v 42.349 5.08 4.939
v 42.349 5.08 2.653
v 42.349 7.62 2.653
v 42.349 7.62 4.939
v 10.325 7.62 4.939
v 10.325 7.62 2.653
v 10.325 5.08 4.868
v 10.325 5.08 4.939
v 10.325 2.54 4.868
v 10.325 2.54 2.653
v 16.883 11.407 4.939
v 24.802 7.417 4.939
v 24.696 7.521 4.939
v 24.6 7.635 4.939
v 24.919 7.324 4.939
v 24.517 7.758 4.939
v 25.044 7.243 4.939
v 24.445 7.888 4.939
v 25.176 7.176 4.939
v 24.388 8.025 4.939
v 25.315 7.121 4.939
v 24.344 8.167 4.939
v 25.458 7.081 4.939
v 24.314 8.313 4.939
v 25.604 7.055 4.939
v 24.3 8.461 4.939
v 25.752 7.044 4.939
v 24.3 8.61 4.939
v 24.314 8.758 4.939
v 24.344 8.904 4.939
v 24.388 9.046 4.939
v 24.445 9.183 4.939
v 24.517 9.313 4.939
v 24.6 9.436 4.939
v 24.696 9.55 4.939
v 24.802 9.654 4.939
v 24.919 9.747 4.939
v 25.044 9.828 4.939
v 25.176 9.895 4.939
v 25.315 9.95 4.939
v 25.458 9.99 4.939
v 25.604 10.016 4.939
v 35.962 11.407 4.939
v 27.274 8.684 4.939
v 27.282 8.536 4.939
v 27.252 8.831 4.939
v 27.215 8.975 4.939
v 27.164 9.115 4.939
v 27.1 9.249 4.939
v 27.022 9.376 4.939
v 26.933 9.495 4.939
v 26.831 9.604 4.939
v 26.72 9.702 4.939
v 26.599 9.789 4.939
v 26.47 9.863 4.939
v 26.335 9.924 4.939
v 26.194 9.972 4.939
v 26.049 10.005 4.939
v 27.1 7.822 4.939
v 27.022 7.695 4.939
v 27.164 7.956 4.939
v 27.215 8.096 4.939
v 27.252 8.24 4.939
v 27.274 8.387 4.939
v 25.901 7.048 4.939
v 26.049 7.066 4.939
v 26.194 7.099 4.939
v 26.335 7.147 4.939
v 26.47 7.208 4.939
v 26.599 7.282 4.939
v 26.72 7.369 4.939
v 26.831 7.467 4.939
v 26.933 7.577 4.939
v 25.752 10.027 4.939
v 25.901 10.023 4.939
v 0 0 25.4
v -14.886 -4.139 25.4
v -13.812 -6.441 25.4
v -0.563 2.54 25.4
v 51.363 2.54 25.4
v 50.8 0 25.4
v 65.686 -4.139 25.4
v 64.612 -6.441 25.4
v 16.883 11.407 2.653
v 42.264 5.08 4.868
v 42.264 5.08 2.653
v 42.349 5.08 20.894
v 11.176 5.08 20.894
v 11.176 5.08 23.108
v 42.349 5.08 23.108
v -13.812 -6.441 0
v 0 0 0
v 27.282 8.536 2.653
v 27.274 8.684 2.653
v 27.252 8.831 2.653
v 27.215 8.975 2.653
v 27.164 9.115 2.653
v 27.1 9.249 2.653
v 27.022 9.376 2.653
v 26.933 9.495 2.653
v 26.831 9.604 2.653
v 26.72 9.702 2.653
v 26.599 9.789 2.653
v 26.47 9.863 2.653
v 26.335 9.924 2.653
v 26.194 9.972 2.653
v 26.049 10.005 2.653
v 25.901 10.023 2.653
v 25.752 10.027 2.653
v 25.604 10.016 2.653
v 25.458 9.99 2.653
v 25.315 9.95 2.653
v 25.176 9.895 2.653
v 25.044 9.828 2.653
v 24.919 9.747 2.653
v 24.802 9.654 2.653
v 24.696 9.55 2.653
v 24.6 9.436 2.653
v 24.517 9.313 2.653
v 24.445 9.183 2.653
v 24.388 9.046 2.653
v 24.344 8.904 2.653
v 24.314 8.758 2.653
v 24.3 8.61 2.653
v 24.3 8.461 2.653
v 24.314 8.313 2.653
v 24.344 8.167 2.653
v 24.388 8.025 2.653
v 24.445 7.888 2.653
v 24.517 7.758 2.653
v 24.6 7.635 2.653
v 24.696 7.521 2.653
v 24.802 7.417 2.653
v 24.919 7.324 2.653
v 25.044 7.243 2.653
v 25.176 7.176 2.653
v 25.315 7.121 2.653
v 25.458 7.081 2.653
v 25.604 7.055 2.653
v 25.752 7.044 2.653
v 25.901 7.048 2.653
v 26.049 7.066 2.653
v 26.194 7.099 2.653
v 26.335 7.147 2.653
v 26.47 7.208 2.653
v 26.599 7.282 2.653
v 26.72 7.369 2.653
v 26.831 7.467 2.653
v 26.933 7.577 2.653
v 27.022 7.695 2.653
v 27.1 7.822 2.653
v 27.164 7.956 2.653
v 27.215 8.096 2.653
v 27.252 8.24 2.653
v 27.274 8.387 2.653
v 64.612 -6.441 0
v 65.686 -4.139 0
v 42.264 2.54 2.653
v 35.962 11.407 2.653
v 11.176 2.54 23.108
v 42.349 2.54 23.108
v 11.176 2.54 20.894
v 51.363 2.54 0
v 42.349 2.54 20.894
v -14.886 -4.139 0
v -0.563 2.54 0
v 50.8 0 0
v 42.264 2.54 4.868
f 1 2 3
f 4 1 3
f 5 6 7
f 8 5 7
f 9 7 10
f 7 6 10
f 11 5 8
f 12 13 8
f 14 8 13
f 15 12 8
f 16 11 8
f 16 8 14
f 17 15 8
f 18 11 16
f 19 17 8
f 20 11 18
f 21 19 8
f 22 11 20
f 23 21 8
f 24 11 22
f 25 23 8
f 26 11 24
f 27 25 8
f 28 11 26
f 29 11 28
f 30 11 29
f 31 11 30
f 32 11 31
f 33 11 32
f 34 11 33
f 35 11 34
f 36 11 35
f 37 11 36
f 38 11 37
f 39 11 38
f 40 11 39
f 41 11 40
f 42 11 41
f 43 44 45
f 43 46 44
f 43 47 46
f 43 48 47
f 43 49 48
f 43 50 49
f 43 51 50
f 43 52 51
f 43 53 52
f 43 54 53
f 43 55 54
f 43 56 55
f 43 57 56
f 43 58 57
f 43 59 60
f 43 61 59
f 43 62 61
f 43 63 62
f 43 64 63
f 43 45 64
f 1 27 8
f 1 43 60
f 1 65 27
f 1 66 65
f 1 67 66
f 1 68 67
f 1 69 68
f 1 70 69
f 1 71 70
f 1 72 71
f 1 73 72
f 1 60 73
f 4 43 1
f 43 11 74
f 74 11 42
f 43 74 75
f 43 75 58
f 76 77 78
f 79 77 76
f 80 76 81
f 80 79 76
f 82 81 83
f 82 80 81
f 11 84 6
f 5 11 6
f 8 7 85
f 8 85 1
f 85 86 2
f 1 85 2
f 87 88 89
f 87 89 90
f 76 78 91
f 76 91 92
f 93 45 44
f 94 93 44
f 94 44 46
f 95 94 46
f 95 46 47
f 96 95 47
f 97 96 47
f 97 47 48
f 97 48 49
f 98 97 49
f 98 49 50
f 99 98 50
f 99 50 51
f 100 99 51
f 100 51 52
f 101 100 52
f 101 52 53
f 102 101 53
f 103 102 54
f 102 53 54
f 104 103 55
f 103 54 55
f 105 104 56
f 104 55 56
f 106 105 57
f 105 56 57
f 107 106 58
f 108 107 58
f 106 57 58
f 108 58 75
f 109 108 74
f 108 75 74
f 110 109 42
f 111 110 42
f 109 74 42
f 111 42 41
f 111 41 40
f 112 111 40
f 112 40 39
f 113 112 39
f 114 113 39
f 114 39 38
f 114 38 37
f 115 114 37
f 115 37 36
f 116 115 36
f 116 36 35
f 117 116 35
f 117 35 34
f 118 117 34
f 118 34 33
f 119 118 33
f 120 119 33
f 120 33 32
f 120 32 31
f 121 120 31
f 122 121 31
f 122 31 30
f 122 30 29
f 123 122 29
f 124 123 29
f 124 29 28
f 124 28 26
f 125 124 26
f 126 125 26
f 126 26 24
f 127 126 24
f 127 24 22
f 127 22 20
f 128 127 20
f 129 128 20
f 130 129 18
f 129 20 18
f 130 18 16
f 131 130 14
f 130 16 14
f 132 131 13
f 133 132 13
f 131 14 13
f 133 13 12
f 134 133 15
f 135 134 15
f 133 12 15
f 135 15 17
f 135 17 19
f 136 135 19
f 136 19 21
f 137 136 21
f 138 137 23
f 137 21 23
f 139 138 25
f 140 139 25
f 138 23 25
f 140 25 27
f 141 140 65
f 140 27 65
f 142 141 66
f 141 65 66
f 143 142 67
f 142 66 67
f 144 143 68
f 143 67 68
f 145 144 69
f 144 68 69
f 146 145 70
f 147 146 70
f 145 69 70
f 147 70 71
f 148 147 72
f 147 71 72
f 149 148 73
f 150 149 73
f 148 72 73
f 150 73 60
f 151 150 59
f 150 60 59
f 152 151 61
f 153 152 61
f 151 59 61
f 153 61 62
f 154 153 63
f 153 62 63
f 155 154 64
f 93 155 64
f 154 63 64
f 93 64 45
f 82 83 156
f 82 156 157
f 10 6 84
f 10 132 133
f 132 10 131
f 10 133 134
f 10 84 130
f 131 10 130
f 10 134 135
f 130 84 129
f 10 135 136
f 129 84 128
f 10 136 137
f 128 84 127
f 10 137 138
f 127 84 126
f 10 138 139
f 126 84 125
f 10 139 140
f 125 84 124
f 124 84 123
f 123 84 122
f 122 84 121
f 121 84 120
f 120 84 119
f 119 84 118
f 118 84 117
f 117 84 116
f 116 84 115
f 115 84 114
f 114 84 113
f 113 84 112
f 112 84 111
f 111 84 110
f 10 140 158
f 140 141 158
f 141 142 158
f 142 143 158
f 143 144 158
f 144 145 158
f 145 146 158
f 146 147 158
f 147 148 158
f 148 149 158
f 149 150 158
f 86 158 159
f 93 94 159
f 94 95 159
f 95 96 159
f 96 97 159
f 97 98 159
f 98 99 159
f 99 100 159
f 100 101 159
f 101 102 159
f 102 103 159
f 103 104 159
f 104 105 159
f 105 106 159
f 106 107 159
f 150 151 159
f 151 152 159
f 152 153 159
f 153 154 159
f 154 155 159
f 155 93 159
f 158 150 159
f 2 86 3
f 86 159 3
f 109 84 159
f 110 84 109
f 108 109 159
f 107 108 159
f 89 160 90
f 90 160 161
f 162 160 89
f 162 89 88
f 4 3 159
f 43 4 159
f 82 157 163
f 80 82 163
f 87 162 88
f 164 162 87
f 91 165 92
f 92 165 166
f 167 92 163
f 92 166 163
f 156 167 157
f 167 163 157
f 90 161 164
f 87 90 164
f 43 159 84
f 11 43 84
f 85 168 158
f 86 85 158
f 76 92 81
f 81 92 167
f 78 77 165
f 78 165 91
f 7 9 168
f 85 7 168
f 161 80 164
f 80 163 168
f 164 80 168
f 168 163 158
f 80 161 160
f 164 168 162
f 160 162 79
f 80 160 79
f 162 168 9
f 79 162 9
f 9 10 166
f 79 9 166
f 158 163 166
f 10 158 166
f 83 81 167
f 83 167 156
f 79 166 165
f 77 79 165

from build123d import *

# Parameters (mm, degrees)
EXTRUDE_THIN1_DEPTH = 25.4
SKETCH3_W           = 31.939411296
SKETCH3_H           = 2.21446585
BOSS_EXTRUDE1_DEPTH = 2.54
SKETCH4_W           = 31.172865425
SKETCH4_H           = 2.21446585
BOSS_EXTRUDE2_DEPTH = 2.54
BOSS_EXTRUDE3_DEPTH = 2.286
SKETCH10_R          = 1.491946279
CUT_EXTRUDE1_DEPTH  = 70.737718879


with BuildPart() as part:
    # Sketch2 → Extrude-Thin1 (new body)
    with BuildSketch(Plane.XY):
        Polygon((-13.812130674, -6.440702309), (0, 0), (50.8, 0), (64.612130674, -6.440702309), (65.685581059, -4.13868053), (51.363104443, 2.54), (-0.563104443, 2.54), (-14.885581059, -4.13868053), align=None)
    extrude(amount=EXTRUDE_THIN1_DEPTH)

    # Sketch3 → Boss-Extrude1 (add)
    with BuildSketch(Plane(origin=(0, 2.54, 0), x_dir=(1, 0, 0), z_dir=(0, 1, 0))):
        with Locations((26.294303516, -3.760480959)):
            Rectangle(SKETCH3_W, SKETCH3_H)
    extrude(amount=BOSS_EXTRUDE1_DEPTH)

    # Sketch4 → Boss-Extrude2 (add)
    with BuildSketch(Plane(origin=(0, 2.54, 0), x_dir=(1, 0, 0), z_dir=(0, 1, 0))):
        with Locations((26.762748216, -22.000859373)):
            Rectangle(SKETCH4_W, SKETCH4_H)
    extrude(amount=BOSS_EXTRUDE2_DEPTH)

    # Sketch6 → Boss-Extrude3 (add)
    with BuildSketch(Plane(origin=(0, 0, 2.653248034), x_dir=(-1, 0, 0), z_dir=(0, 0, -1))):
        Polygon((-42.349180928, 5.08), (-42.349180928, 7.62), (-35.961730939, 11.406642995), (-16.883255925, 11.406642995), (-10.324597868, 7.62), (-10.324597868, 5.08), align=None)
    extrude(amount=-BOSS_EXTRUDE3_DEPTH)

    # Sketch10 → Cut-Extrude1 (cut, through all)
    with BuildSketch(Plane.XY.offset(4.939248034)):
        with Locations((25.789671125, 8.535532201)):
            Circle(SKETCH10_R)
    extrude(amount=-CUT_EXTRUDE1_DEPTH, mode=Mode.SUBTRACT)


solid = part.part
